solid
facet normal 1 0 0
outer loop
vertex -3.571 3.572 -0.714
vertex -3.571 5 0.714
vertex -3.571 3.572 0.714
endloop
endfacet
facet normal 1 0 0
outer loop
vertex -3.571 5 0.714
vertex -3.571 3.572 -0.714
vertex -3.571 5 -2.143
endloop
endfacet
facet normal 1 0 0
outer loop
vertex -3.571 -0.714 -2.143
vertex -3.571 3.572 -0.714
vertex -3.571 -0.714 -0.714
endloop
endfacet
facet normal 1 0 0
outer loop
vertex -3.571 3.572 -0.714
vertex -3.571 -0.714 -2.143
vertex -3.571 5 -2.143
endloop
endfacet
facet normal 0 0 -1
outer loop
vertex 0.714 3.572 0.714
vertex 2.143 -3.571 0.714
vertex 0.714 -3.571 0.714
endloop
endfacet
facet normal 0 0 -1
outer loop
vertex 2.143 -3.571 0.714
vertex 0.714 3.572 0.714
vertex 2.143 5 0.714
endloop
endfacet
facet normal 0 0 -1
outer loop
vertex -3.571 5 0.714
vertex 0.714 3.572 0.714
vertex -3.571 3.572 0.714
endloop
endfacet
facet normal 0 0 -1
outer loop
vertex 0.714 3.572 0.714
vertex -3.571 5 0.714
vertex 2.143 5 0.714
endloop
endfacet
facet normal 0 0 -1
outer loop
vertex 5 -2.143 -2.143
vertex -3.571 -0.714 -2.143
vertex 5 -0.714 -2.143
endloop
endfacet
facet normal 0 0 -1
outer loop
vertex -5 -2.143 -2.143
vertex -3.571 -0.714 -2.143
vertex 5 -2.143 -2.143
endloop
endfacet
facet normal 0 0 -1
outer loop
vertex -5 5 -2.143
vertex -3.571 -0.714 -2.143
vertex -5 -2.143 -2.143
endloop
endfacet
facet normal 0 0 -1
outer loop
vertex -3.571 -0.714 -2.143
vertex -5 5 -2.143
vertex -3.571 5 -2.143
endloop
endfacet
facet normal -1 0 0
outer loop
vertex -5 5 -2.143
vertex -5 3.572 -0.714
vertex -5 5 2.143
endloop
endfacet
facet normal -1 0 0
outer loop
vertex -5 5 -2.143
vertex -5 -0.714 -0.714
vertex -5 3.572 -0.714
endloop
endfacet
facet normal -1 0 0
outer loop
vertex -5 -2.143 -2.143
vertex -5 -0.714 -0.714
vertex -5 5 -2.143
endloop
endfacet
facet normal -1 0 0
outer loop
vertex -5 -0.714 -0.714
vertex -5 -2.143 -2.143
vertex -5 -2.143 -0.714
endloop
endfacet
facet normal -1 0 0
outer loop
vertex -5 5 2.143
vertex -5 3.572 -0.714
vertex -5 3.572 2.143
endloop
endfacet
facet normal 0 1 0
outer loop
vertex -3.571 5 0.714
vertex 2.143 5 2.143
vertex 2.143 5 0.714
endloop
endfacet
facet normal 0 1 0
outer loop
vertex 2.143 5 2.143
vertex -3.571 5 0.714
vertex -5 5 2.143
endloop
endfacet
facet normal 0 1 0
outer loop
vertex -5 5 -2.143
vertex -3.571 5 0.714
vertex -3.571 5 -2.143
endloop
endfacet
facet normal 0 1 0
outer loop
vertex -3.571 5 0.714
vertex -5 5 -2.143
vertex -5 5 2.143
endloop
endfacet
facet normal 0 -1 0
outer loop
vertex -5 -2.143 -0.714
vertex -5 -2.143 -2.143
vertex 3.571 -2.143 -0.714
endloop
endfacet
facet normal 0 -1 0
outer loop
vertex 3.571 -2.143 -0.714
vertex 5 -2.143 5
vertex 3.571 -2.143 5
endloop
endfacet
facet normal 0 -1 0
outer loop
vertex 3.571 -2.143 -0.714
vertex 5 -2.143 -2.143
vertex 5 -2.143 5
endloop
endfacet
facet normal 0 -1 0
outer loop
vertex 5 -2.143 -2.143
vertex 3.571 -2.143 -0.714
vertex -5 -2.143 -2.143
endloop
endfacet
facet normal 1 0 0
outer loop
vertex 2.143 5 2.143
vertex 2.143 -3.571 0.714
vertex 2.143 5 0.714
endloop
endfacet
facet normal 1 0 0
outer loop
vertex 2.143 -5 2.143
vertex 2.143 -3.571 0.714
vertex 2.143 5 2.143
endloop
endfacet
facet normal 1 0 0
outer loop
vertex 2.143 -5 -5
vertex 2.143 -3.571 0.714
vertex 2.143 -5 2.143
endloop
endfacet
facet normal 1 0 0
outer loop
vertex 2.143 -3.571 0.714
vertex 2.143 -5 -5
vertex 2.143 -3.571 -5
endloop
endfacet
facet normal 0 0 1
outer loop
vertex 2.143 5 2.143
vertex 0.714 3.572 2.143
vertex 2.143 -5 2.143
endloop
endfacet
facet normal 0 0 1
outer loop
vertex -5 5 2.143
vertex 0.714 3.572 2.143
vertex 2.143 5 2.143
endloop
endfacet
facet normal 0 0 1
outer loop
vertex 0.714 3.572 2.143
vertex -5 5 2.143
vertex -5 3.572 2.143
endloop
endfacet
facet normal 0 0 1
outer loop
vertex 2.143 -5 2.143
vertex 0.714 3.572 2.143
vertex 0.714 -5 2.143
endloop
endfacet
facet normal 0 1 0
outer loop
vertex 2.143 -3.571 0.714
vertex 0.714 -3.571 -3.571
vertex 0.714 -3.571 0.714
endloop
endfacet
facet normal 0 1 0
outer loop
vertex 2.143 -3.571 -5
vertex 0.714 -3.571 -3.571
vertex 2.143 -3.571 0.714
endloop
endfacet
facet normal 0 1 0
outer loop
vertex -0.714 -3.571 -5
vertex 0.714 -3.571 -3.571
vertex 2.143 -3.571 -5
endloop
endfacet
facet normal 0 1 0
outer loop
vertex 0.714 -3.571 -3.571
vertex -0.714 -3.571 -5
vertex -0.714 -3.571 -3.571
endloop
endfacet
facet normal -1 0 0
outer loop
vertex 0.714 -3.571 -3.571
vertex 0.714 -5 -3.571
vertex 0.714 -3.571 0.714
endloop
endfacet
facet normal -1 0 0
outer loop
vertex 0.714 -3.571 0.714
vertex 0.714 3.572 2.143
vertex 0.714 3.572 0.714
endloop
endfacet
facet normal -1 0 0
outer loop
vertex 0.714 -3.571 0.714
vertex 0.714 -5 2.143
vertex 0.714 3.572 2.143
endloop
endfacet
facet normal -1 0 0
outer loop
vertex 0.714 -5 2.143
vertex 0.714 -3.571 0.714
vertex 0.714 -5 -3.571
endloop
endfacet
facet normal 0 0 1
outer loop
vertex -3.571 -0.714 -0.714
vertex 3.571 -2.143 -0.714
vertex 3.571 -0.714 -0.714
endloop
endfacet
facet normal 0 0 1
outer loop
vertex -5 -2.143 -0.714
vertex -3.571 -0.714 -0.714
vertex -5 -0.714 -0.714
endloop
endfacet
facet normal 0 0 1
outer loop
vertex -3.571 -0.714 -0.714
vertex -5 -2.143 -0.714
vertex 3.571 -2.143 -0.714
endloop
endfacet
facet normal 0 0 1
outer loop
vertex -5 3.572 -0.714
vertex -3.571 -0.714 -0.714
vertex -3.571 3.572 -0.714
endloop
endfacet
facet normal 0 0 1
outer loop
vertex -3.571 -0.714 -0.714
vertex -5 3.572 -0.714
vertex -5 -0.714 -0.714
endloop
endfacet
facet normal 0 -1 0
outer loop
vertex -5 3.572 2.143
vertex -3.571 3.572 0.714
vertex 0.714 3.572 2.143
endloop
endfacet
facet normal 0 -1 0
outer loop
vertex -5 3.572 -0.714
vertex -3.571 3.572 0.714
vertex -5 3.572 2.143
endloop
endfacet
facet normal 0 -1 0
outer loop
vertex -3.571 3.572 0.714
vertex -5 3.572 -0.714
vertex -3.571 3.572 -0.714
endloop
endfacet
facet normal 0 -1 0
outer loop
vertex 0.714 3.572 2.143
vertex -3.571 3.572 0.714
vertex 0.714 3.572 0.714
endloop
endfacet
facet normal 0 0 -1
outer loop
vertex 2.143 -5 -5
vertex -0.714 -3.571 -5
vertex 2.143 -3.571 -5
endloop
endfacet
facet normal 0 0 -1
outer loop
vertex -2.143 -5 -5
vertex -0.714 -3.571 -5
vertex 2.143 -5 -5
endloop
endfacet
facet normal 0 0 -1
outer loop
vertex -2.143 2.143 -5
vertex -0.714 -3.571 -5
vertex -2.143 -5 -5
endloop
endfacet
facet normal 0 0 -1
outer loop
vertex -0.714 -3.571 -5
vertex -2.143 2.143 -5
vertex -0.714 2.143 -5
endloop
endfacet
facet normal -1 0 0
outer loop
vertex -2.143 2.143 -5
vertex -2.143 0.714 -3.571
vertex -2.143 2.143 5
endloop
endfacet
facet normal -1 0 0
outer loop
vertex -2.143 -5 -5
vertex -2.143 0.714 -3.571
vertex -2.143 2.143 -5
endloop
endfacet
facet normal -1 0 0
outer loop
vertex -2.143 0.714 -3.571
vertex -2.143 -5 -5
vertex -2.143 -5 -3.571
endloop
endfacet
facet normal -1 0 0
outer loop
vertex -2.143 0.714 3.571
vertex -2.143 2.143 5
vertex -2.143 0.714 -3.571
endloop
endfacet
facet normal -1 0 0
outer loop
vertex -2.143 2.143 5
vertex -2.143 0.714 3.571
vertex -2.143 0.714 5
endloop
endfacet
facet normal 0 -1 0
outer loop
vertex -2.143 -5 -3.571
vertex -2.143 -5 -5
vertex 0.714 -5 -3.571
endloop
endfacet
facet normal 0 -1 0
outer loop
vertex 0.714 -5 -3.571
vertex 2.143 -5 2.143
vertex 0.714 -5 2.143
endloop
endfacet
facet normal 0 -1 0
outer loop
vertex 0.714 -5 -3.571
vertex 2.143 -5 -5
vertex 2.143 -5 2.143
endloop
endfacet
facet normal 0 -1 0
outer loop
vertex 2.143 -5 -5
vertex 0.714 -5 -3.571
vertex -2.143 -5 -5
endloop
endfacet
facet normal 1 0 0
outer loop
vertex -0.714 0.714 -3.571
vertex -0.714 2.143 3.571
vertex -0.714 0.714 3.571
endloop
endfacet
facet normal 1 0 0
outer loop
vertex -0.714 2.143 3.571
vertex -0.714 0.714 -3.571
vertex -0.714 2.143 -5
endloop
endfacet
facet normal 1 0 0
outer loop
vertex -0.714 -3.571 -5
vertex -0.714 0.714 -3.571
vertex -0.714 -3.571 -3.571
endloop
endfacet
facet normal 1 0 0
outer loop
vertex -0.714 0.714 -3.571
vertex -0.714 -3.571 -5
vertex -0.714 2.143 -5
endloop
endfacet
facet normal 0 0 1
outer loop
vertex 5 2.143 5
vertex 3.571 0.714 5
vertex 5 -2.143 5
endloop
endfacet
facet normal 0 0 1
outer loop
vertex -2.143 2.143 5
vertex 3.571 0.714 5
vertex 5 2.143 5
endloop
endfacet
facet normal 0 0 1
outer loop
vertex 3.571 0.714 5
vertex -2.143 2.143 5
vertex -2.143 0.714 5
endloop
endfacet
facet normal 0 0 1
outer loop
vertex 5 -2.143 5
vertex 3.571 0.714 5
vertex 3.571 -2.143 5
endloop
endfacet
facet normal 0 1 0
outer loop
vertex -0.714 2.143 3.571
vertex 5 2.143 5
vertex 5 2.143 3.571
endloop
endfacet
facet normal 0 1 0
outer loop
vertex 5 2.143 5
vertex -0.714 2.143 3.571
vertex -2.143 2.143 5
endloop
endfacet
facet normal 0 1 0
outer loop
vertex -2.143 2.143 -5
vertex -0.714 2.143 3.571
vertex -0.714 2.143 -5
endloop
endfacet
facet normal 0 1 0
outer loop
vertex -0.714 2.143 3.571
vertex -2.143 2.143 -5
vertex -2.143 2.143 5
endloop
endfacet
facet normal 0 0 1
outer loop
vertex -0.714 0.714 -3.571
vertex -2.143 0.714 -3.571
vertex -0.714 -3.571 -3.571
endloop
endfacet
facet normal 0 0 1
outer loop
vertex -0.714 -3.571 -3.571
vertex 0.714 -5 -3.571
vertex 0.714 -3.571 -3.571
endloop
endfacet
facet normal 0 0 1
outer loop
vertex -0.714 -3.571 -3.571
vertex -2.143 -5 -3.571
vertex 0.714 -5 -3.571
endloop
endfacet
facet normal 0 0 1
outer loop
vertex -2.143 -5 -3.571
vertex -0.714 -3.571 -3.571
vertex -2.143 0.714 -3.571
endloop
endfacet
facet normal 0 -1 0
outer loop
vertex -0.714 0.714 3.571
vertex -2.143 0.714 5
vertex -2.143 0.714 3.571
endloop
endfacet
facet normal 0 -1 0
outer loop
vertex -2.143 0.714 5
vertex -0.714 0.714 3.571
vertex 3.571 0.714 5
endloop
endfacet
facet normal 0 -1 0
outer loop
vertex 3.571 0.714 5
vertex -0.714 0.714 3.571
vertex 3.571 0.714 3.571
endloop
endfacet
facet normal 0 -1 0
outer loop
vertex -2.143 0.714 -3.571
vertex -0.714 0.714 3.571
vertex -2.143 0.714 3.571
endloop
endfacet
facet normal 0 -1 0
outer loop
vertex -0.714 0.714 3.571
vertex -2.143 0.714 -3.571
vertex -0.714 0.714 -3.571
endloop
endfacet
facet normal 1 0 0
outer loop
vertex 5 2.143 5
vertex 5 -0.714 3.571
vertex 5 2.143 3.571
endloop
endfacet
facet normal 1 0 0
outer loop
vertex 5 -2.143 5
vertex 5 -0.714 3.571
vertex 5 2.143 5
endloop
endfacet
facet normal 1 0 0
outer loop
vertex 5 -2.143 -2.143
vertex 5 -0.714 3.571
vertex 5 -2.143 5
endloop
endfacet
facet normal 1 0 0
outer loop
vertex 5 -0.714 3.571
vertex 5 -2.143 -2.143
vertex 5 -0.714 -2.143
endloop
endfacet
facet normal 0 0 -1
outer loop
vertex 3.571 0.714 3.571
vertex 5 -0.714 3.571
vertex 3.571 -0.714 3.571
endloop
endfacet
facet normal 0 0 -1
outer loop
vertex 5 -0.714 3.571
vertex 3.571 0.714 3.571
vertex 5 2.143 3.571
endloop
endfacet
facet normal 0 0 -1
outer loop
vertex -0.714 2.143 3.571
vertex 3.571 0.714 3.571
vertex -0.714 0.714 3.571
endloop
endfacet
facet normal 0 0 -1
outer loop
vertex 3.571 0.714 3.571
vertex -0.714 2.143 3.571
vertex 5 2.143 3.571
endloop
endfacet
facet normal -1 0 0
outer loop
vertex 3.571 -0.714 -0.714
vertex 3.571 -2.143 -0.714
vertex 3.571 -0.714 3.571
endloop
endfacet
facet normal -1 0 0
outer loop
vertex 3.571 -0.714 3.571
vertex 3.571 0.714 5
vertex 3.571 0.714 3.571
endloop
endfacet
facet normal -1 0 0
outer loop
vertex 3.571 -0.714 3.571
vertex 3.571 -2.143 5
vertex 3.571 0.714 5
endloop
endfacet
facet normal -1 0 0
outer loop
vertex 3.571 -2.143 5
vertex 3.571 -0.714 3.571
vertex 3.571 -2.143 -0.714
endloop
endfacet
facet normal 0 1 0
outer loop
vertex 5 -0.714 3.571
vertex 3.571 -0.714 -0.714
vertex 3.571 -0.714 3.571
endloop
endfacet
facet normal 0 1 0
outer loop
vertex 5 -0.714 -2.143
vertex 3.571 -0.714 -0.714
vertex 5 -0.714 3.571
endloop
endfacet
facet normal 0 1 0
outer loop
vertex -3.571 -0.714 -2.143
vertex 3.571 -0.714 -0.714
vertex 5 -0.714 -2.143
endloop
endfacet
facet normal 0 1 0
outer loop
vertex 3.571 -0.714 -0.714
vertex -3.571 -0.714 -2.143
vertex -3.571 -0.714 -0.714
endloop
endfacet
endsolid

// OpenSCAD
intersection() {
translate([-6, -6, -6]) cube(size = [12, 12, 12], center = false);
union() {
translate([3.571, -2.143, 3.571]) cube(size = [1.429, 4.286, 1.429], center = false);
translate([-2.143, 0.714, 3.571]) cube(size = [5.714, 1.429, 1.429], center = false);
difference() {
union() {
translate([-5, -2.143, -2.143]) cube(size = [1.429, 7.143, 2.857], center = false);
translate([-5, -3.571, 0.714]) cube(size = [7.143, 8.571, 1.429], center = false);
}
translate([-18.1, -3.571, -0.714]) cube(size = [18.814, 7.143, 2.857], center = false);
}
translate([3.571, -2.143, -0.714]) cube(size = [1.429, 1.429, 4.286], center = false);
translate([-5, -2.143, -2.143]) cube(size = [10, 1.429, 1.429], center = false);
difference() {
union() {
translate([-2.143, -5, -5]) cube(size = [4.286, 1.429, 7.143], center = false);
translate([-2.143, -5, -5]) cube(size = [1.429, 7.143, 10], center = false);
}
translate([-2.143, -5, -3.571]) cube(size = [2.857, 5.714, 8.571], center = false);
}
}
}
